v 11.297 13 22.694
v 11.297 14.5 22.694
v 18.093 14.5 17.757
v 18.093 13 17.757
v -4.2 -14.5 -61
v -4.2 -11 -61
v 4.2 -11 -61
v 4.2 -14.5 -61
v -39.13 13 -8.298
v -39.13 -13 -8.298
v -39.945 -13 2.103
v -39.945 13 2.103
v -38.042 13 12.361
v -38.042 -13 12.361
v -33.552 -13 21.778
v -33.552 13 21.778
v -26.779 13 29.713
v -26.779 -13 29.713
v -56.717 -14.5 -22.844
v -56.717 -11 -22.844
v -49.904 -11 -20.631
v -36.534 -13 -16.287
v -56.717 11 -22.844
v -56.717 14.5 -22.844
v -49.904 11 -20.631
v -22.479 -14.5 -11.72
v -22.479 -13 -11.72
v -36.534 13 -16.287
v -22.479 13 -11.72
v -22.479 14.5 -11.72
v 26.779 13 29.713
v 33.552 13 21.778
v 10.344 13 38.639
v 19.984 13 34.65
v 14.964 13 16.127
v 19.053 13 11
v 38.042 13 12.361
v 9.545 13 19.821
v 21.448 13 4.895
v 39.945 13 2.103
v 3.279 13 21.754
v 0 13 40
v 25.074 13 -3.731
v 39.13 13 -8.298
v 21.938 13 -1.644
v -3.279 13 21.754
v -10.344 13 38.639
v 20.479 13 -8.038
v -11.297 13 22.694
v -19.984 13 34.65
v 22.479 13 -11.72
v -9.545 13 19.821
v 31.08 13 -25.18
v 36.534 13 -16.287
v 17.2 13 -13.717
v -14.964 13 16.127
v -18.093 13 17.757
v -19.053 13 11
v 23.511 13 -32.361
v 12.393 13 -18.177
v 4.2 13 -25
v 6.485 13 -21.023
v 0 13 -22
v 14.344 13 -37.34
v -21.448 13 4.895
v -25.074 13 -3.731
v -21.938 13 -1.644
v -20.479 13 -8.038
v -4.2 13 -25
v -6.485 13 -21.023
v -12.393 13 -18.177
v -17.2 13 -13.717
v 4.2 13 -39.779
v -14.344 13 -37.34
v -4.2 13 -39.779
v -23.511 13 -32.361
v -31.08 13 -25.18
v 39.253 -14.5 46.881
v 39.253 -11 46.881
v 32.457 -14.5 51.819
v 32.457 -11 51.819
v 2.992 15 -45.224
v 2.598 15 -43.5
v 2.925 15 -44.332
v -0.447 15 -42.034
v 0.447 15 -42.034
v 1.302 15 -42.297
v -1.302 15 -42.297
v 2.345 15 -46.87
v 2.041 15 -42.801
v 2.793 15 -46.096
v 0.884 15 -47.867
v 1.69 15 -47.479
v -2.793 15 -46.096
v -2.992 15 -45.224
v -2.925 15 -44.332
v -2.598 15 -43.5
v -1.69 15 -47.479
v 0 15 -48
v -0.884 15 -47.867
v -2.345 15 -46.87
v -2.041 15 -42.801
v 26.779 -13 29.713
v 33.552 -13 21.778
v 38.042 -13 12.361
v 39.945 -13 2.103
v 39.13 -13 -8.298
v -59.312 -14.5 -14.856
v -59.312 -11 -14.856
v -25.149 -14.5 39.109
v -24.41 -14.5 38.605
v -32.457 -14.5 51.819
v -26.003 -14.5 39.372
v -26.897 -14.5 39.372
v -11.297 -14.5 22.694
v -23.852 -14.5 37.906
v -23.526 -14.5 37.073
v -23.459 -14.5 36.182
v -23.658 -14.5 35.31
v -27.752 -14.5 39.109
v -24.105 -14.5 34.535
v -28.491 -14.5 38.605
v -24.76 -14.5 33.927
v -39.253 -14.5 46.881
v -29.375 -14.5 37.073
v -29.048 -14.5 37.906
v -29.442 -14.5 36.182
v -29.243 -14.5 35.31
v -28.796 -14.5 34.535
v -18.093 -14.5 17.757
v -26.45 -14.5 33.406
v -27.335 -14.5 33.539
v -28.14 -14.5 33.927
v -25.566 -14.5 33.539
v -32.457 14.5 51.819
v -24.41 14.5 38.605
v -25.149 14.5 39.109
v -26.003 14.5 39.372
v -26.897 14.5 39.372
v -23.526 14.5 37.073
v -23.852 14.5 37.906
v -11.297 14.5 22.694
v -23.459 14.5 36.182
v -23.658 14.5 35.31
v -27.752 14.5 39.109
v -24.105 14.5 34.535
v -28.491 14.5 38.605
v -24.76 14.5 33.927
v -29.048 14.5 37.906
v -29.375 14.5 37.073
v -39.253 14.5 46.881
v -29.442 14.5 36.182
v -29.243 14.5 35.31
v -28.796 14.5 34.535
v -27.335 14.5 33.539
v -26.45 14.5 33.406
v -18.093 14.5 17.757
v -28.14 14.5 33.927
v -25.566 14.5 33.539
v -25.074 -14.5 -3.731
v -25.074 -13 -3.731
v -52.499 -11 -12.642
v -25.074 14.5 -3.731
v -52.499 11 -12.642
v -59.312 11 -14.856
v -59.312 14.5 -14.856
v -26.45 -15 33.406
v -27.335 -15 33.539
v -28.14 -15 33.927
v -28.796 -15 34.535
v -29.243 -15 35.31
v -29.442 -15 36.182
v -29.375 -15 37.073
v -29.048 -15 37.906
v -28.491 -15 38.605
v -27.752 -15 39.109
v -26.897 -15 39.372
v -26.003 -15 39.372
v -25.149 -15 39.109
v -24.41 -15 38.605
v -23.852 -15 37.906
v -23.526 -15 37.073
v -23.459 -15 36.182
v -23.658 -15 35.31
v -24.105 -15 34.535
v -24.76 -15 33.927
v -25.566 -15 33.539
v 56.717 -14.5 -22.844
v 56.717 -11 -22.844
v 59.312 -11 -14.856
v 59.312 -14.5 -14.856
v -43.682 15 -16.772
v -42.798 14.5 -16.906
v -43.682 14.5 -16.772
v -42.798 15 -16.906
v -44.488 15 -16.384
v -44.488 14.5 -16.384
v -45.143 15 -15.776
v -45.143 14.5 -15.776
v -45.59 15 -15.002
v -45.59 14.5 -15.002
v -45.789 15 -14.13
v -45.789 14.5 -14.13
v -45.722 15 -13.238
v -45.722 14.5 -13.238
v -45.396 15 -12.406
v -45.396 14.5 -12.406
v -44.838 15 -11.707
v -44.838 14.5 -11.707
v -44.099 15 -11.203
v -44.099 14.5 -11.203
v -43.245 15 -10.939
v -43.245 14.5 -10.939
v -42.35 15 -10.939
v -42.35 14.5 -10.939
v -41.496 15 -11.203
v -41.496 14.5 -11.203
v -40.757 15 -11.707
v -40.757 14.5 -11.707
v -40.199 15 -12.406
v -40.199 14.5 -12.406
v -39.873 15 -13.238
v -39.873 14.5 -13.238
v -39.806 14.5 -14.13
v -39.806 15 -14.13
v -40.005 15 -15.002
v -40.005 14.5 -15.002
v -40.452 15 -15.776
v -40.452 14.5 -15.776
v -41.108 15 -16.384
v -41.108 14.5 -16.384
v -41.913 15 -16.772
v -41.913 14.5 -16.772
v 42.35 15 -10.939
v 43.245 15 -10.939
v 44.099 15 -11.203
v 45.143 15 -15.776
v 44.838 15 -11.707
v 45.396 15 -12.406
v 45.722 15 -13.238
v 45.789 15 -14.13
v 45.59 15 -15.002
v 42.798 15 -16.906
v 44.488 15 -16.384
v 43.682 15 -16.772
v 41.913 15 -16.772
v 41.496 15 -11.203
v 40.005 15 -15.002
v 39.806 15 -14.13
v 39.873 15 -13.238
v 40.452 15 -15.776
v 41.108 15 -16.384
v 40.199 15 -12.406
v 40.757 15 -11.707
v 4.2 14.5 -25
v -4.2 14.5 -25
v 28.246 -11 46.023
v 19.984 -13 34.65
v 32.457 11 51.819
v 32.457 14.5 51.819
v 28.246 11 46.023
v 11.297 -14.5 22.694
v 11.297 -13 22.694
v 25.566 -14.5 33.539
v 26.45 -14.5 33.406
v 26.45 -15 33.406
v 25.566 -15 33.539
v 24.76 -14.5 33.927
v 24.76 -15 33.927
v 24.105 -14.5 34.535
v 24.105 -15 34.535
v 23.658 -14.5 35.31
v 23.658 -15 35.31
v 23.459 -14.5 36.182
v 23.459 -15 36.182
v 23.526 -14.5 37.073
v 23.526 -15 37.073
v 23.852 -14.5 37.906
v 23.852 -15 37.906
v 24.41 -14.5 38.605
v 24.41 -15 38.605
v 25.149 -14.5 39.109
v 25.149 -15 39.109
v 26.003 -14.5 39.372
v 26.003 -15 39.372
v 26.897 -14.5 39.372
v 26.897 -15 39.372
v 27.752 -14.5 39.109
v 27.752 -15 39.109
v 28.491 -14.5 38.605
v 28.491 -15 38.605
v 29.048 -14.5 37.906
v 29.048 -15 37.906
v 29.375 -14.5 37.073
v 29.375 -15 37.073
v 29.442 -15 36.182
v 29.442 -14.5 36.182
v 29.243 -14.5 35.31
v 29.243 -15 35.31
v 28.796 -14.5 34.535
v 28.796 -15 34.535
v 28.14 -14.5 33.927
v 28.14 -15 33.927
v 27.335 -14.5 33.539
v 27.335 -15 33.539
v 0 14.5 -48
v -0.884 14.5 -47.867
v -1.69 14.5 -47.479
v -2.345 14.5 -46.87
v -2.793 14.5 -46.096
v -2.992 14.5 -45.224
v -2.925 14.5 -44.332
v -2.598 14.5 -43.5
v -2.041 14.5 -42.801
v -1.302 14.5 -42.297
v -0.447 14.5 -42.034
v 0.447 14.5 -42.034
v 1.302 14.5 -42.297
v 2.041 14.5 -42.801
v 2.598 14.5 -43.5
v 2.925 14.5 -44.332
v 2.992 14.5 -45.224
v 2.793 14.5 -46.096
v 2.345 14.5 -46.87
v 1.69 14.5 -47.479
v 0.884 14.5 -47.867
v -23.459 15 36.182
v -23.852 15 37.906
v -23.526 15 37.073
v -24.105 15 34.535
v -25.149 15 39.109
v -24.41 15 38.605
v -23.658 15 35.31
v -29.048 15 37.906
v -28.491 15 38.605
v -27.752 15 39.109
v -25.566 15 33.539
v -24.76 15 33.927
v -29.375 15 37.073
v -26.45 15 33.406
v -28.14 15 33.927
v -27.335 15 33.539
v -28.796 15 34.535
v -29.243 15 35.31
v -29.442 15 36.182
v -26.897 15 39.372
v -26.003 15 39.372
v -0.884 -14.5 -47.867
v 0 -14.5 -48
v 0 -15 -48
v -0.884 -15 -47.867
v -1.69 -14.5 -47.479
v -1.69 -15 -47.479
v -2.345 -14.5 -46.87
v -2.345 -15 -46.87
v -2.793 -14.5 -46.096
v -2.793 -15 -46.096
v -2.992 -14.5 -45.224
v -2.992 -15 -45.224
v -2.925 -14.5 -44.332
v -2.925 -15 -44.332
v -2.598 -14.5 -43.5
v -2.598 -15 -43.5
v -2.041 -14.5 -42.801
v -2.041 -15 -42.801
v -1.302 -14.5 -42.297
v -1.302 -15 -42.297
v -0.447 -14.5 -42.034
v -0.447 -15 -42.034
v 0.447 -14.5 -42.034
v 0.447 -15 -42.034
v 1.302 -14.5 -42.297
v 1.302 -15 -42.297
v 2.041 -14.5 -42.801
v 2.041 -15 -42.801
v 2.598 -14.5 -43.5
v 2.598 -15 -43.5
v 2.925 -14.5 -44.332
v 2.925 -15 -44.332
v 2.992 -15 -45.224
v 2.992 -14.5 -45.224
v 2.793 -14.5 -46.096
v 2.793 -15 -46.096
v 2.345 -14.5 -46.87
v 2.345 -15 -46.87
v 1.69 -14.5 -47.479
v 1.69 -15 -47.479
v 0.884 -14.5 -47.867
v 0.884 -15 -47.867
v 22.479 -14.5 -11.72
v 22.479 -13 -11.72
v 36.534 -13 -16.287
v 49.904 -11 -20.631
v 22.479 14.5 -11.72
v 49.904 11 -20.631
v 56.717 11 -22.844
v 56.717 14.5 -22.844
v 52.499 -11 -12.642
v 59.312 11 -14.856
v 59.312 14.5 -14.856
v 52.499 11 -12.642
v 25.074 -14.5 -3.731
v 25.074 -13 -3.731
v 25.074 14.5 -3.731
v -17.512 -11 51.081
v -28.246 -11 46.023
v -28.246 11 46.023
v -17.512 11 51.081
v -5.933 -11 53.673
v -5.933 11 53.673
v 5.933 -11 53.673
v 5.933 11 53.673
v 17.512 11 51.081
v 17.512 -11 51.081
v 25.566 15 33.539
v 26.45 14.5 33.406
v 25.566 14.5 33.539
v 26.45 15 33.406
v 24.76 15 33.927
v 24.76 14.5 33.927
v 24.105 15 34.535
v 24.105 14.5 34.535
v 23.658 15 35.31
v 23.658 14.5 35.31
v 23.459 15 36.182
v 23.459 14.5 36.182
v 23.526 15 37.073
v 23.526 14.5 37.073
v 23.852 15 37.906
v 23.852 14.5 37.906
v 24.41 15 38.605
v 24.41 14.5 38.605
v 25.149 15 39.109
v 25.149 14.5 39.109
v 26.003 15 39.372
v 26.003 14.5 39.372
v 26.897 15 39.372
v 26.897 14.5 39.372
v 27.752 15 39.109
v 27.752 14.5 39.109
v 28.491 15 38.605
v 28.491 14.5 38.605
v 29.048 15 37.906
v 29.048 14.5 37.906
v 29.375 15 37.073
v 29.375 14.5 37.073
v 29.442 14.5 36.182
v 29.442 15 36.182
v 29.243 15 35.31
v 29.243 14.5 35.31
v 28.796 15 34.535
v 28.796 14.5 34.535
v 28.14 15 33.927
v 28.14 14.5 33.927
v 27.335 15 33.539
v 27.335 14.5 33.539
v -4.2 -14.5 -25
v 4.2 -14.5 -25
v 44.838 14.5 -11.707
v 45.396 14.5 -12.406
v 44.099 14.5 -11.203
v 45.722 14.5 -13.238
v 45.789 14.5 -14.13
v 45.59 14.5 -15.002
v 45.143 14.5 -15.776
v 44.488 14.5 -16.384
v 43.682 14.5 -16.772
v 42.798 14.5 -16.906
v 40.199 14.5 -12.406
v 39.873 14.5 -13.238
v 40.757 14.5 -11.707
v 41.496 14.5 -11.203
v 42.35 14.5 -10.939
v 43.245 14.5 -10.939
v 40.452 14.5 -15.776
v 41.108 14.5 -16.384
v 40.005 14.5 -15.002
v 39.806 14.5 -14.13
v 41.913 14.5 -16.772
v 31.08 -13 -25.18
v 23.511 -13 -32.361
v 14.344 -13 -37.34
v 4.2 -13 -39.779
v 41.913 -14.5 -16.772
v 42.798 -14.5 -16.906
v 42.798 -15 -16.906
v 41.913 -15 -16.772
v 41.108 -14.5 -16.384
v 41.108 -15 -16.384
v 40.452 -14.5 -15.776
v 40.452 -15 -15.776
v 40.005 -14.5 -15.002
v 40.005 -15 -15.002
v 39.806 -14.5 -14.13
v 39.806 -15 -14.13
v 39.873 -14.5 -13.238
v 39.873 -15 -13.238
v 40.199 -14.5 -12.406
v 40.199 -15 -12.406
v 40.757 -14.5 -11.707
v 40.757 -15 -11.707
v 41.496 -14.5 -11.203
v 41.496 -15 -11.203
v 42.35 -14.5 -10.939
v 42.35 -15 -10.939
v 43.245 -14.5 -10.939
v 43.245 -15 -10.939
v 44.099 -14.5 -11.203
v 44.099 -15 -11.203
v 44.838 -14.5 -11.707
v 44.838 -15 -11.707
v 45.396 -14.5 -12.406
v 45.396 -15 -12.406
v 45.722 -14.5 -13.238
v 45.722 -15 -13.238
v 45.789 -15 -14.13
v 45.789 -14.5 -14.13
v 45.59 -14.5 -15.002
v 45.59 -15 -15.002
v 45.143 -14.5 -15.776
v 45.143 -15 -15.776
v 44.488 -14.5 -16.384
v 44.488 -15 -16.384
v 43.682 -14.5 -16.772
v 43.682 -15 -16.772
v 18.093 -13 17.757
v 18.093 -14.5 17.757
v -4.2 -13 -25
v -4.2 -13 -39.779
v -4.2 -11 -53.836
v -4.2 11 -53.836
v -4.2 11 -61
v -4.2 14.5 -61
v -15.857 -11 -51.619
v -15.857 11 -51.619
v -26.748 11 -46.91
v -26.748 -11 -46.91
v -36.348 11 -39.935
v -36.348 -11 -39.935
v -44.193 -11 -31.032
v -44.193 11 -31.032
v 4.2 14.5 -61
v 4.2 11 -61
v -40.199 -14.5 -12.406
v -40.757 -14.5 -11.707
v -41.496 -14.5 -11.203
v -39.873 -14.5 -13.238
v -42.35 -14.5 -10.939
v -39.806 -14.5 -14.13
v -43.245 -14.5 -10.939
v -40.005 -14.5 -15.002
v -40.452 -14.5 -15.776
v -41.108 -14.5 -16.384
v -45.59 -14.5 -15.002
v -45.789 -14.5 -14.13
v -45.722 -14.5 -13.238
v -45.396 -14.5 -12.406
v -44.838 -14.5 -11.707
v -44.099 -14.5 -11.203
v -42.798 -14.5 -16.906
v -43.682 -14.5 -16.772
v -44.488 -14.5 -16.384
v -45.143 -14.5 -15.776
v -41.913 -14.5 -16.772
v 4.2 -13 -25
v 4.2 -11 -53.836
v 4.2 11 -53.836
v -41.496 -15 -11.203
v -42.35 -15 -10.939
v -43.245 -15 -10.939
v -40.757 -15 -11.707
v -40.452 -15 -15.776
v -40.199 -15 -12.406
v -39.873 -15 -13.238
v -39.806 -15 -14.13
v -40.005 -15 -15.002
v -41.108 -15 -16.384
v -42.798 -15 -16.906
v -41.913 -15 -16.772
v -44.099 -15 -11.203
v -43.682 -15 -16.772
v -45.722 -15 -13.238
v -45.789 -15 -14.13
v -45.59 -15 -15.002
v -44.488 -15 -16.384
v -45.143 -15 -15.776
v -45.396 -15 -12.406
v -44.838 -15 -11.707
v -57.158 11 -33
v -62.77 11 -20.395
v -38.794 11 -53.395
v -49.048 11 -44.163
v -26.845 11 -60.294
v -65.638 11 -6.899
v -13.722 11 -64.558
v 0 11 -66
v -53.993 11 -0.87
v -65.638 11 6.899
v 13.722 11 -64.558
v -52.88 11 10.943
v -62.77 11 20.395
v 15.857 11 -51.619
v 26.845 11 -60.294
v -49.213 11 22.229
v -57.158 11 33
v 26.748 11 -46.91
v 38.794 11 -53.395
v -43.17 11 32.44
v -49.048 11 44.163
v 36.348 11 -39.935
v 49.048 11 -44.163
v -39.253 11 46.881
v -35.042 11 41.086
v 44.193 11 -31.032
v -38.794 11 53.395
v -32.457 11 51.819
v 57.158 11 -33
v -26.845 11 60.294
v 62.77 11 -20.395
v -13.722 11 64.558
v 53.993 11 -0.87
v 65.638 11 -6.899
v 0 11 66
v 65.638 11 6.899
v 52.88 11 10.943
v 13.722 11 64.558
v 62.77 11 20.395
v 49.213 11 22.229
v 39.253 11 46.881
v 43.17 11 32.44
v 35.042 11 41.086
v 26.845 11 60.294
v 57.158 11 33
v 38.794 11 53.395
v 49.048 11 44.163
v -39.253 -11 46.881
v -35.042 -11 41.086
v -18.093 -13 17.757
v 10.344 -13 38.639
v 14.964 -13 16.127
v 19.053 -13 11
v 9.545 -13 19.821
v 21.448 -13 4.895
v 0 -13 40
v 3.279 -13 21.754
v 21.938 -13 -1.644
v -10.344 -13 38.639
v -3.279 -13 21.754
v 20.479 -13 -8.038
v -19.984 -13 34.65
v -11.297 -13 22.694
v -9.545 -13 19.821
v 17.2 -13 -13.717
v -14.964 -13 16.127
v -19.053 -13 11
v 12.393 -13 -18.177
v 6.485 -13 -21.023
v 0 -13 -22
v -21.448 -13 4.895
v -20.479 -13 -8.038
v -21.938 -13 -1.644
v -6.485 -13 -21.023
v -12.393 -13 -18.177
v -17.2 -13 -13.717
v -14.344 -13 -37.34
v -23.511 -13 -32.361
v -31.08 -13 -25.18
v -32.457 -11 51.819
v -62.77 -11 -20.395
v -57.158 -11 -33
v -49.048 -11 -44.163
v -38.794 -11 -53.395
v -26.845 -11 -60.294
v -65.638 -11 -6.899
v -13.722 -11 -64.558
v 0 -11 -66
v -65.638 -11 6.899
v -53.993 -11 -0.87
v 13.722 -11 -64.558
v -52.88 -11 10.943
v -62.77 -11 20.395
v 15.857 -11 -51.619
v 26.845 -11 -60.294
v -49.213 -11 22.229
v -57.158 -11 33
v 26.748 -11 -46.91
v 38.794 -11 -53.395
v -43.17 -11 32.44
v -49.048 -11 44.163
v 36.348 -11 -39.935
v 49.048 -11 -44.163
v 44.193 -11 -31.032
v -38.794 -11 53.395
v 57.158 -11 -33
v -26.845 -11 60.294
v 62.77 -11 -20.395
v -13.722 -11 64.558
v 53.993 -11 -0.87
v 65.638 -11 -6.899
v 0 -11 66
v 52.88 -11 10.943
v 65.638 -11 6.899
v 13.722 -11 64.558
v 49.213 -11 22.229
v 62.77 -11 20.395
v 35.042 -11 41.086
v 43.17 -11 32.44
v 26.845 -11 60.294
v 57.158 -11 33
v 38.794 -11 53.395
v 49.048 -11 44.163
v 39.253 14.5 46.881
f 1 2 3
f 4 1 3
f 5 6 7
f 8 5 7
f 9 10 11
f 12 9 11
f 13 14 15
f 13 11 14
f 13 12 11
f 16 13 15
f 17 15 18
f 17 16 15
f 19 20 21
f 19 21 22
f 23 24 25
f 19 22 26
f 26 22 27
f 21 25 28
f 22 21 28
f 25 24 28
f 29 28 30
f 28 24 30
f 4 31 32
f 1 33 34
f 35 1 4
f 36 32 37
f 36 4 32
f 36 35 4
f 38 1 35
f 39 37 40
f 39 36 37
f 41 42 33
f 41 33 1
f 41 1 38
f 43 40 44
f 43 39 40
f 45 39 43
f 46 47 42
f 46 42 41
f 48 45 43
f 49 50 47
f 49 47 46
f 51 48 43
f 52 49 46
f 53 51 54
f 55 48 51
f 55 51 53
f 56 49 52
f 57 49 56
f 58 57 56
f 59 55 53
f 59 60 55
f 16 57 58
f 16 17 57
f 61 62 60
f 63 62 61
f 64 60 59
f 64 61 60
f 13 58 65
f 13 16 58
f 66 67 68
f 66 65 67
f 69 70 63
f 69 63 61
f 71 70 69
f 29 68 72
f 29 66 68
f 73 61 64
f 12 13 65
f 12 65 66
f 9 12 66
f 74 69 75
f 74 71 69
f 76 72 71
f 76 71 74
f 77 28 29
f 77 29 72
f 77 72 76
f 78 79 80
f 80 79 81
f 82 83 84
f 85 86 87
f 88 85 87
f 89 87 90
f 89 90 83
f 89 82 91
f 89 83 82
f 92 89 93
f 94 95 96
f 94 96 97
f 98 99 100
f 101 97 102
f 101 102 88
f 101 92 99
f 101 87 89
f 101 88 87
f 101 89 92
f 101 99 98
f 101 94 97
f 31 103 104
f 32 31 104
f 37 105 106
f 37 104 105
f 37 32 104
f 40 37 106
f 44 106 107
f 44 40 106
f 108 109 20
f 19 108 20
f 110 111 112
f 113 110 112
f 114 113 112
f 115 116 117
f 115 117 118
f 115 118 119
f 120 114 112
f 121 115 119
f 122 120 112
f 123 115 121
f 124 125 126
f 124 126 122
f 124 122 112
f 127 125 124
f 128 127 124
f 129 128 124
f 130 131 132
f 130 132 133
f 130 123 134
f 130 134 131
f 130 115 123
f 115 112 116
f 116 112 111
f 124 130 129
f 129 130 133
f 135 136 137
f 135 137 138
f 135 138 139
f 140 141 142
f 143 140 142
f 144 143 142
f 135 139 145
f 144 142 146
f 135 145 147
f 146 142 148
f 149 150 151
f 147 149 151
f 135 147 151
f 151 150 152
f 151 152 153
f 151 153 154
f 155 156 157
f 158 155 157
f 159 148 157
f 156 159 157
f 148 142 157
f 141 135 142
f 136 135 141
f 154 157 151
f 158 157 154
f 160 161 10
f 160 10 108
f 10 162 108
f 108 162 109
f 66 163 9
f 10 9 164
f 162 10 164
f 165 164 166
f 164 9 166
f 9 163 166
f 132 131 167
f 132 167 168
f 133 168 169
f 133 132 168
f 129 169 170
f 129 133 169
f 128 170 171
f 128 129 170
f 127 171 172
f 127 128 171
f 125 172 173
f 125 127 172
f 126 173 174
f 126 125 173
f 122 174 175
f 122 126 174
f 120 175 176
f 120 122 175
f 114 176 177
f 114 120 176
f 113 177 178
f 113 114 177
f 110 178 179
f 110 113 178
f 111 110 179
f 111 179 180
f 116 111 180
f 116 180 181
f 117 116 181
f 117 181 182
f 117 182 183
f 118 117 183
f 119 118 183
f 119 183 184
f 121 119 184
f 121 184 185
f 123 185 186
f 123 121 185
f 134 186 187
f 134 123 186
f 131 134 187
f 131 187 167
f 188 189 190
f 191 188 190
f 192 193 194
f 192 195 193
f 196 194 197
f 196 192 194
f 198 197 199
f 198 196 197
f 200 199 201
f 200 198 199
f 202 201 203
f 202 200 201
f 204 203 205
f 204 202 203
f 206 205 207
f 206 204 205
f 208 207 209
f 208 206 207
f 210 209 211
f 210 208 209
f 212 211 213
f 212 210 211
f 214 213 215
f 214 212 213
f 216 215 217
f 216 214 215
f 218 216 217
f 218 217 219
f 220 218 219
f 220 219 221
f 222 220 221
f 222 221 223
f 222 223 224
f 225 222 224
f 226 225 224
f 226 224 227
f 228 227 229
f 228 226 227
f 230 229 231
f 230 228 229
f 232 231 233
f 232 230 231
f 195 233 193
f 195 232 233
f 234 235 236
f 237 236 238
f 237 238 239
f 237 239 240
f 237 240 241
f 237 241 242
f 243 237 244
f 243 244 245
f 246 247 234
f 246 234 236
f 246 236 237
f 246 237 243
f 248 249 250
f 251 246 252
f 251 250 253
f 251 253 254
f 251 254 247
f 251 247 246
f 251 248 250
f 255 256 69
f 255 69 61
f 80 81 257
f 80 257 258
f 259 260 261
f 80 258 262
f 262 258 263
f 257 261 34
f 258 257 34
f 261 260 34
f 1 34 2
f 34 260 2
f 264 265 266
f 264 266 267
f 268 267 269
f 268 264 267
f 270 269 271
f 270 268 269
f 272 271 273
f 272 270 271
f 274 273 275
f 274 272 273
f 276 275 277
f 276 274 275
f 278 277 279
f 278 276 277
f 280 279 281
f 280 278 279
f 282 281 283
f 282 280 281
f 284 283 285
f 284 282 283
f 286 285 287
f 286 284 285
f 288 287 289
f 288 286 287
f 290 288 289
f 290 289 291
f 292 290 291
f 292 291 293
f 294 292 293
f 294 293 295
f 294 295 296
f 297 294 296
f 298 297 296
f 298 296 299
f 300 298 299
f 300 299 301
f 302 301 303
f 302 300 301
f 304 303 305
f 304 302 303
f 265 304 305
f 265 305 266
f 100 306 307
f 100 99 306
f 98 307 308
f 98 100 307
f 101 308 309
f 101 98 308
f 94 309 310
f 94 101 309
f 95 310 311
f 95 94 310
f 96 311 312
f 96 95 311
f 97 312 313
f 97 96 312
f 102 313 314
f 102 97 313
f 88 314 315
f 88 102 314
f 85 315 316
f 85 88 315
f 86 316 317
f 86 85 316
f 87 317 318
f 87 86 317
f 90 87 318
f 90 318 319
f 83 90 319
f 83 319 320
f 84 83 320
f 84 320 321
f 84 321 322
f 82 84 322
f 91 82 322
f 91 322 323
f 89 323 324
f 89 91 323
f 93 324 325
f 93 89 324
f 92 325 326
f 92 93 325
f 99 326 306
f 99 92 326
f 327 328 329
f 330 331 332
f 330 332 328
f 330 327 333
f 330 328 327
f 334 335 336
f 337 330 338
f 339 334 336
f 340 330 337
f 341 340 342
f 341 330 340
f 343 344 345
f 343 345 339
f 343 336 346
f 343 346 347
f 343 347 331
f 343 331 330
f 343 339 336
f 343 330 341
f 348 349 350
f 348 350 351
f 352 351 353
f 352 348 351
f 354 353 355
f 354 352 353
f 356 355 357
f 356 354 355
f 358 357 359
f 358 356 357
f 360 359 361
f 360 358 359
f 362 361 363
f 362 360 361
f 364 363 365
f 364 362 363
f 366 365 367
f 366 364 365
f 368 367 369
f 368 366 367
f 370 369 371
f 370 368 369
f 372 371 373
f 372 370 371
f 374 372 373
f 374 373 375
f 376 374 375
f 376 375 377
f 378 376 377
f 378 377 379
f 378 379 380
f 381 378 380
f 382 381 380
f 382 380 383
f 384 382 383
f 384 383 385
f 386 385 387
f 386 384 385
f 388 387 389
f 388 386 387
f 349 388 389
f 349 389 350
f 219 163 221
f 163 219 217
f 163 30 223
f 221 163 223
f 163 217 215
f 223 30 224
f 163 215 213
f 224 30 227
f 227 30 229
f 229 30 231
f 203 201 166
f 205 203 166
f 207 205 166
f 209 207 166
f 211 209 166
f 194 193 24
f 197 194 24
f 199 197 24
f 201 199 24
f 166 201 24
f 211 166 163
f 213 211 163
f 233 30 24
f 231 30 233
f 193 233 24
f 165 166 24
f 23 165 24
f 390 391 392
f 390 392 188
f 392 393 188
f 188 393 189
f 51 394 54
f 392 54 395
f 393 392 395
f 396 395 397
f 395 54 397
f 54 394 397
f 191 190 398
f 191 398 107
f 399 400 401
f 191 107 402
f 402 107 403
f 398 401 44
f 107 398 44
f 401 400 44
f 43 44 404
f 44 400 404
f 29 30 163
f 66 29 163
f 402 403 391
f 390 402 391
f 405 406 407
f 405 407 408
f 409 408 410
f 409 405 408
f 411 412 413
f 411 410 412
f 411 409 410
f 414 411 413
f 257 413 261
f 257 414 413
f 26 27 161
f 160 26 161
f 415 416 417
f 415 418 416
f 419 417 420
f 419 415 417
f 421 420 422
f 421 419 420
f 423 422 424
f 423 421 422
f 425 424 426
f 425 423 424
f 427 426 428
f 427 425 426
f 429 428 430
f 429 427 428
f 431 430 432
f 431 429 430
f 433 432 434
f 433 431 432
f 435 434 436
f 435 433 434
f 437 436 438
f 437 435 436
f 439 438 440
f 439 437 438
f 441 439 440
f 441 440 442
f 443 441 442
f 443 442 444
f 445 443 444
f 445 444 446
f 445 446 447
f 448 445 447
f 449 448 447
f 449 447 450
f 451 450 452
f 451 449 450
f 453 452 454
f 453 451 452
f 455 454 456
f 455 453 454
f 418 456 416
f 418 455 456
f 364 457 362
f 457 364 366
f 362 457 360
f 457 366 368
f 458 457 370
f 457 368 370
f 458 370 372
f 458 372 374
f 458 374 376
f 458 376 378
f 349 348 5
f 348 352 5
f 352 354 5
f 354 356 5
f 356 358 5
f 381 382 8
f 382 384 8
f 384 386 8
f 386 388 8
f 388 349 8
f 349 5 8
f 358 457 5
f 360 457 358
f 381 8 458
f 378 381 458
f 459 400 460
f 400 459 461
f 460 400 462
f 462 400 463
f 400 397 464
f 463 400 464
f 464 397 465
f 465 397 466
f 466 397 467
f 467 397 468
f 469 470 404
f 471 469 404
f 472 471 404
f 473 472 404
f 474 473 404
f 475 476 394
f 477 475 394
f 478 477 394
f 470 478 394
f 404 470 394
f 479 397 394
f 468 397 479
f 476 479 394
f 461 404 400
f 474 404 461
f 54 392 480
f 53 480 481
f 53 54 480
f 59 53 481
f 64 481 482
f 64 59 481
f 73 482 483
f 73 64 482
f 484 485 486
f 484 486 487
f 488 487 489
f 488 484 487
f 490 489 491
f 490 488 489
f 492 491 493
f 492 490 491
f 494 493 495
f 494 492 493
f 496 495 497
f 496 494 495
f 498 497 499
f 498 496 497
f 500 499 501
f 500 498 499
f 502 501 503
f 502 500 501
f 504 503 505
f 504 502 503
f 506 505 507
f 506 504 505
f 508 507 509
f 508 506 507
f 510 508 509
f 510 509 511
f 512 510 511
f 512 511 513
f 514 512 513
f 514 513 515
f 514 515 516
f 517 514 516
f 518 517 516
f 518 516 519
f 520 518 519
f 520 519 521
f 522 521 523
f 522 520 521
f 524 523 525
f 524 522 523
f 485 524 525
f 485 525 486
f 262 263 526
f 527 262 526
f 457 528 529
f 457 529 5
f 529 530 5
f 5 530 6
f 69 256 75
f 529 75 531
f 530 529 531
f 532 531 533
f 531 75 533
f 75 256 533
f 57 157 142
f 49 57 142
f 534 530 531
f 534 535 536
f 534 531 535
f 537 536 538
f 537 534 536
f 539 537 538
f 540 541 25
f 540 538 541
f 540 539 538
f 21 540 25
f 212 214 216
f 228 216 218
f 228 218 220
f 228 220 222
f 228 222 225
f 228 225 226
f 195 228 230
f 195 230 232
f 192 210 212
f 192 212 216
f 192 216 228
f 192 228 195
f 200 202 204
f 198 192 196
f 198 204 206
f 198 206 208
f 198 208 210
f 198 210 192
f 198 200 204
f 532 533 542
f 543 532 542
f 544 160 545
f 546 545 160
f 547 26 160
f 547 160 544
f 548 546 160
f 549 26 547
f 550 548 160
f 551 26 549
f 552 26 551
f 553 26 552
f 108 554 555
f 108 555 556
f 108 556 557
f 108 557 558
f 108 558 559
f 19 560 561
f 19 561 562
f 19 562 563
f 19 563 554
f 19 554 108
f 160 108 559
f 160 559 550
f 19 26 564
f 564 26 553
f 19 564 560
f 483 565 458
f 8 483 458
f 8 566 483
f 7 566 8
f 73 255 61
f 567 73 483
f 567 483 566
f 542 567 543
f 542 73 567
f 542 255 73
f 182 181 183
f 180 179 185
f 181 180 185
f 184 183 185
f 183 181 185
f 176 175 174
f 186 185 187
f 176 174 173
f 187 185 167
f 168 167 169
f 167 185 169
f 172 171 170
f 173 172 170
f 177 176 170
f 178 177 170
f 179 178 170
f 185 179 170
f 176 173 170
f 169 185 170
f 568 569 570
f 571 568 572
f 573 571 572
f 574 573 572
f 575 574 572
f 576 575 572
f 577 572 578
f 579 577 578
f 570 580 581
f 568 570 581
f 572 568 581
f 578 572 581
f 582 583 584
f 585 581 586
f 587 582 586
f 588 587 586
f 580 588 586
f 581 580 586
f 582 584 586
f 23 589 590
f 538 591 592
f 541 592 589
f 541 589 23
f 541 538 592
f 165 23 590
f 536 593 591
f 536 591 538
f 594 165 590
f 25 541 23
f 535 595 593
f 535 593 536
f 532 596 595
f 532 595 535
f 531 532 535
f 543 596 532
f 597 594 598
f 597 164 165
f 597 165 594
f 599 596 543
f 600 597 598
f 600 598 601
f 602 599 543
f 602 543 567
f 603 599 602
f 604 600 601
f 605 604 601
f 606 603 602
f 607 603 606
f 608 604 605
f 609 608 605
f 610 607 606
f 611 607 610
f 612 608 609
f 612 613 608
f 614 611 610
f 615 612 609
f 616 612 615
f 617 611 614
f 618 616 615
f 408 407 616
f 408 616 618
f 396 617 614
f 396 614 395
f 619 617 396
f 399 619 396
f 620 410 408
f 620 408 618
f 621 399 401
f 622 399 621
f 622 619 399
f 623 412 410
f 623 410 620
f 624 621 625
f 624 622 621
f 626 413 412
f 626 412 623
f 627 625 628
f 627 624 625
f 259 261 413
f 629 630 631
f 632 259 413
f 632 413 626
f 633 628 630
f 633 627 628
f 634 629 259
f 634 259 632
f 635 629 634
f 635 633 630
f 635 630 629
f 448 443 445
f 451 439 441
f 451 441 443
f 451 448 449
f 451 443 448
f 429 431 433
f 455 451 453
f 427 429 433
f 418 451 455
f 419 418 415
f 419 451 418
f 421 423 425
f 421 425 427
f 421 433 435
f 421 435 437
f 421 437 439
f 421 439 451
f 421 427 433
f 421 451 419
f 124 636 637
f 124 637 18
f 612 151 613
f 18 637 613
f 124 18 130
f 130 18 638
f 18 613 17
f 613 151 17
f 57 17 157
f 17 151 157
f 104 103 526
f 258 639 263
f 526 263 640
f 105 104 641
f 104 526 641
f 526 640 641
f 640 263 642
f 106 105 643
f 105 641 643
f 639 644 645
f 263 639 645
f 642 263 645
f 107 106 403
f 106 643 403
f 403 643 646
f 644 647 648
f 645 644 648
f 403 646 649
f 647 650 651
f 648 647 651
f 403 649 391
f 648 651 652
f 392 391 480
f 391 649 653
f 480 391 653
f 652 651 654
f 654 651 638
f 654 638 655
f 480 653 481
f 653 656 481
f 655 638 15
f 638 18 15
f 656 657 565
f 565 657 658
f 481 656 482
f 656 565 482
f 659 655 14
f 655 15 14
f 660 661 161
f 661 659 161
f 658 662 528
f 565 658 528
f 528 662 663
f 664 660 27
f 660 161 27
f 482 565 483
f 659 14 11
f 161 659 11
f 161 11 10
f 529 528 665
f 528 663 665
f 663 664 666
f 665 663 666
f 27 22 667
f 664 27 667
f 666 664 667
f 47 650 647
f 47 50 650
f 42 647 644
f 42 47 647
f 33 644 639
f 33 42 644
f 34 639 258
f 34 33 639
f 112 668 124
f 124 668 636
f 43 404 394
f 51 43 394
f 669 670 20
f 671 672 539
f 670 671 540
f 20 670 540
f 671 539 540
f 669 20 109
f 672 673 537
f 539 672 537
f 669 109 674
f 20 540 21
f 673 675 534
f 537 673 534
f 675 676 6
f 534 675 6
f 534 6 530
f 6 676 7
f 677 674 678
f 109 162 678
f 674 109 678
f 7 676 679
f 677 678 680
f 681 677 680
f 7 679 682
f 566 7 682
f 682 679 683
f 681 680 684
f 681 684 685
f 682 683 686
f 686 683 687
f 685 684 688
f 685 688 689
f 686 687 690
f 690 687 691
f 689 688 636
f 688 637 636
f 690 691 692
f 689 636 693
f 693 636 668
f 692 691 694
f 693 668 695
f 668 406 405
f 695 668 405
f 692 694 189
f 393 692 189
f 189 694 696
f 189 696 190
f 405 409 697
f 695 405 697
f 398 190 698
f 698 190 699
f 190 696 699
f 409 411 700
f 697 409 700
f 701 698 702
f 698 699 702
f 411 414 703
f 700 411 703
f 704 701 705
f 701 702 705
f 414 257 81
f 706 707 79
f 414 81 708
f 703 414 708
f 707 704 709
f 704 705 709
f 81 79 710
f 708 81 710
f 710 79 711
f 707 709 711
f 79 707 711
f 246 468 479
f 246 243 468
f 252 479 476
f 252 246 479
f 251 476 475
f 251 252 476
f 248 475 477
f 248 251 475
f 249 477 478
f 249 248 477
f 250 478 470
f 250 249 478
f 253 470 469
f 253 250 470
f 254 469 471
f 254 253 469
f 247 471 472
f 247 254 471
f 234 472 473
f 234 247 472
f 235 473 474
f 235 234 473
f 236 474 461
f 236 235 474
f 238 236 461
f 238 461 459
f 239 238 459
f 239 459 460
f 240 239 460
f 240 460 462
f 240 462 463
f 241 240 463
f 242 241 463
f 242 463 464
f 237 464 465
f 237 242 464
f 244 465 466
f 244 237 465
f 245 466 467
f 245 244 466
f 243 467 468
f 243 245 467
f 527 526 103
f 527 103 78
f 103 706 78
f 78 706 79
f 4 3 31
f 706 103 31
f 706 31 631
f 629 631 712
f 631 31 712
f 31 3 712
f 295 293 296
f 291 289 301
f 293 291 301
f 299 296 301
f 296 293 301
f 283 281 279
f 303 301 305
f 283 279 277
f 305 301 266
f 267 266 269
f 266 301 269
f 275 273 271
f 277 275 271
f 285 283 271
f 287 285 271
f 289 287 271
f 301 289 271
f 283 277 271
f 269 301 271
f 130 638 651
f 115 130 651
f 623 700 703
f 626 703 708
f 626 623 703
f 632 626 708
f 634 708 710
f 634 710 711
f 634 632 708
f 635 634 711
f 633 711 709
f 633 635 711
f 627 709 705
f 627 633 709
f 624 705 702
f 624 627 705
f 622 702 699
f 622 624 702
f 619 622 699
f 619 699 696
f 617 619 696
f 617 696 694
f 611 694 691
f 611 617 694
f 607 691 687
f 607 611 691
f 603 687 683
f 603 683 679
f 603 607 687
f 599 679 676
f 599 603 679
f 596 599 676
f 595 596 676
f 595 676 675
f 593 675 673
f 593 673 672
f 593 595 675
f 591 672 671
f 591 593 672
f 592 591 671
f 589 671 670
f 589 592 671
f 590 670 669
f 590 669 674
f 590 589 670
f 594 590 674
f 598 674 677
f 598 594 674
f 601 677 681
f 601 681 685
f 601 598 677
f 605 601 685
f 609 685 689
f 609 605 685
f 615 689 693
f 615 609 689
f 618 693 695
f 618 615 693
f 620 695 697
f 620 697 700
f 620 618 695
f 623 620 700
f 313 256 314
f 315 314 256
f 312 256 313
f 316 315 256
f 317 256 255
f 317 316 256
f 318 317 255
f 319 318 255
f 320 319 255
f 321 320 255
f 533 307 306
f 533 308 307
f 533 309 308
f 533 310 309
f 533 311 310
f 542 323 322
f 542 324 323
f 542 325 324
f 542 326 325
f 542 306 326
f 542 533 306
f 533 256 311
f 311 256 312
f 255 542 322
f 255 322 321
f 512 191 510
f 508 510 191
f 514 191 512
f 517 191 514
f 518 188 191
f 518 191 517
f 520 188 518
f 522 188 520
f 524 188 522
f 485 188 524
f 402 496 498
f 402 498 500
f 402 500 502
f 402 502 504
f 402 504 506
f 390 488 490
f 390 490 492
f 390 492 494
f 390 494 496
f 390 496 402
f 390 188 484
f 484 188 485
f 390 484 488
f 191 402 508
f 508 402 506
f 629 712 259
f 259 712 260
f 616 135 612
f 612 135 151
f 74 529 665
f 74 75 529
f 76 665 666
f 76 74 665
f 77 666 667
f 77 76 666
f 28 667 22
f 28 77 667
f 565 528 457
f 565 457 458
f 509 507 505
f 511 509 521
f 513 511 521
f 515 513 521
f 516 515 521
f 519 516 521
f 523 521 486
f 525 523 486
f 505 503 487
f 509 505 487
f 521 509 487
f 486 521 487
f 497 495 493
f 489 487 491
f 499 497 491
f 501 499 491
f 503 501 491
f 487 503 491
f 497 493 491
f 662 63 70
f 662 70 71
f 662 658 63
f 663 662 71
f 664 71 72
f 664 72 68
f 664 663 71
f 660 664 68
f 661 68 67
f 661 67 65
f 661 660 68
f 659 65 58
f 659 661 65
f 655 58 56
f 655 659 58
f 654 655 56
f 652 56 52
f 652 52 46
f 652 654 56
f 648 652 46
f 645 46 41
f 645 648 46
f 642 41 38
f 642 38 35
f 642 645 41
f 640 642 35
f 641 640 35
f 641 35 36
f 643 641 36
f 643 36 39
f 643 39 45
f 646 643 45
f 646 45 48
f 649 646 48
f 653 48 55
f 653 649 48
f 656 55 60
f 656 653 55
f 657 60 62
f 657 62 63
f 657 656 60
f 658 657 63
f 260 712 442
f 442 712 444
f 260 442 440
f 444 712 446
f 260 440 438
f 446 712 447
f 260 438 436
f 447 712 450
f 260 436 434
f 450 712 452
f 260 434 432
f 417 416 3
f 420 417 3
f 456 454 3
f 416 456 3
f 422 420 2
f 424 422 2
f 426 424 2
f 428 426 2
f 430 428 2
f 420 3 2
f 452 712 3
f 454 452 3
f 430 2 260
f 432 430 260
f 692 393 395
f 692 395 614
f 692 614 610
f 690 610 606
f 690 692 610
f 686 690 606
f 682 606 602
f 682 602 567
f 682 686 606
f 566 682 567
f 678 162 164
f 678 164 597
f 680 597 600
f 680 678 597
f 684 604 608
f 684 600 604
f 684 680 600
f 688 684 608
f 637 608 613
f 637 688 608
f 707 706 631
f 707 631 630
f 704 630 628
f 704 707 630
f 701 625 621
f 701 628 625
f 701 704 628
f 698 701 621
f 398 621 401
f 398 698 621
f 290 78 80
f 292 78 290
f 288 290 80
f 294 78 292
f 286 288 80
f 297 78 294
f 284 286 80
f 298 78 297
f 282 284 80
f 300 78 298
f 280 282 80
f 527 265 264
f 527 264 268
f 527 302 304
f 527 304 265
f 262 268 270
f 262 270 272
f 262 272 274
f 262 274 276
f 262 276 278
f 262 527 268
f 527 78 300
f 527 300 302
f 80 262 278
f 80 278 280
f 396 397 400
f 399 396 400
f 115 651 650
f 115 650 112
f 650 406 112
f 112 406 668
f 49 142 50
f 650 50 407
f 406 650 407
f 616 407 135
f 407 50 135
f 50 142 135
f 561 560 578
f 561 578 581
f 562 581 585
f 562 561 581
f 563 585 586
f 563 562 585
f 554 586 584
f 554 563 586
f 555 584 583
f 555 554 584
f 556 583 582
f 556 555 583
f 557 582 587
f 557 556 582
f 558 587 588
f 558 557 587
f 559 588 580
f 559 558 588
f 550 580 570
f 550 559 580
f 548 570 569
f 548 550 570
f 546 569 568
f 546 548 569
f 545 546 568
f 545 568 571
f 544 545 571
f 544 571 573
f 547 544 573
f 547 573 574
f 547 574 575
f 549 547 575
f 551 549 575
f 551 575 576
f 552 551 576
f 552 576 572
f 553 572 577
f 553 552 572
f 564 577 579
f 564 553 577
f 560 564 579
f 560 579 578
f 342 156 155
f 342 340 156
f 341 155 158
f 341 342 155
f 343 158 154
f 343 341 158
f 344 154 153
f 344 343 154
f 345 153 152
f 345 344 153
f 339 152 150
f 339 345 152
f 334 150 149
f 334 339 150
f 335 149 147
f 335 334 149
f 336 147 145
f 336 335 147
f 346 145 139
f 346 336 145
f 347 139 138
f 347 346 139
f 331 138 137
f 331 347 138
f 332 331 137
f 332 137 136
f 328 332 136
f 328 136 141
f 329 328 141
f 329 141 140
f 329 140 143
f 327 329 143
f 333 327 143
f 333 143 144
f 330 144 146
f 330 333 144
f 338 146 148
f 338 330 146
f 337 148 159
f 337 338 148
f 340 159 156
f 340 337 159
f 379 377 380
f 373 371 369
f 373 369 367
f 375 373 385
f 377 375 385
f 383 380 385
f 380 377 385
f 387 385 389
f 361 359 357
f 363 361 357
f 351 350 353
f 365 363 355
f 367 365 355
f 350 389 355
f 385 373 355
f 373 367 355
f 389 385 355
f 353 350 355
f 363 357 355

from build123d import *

# Parameters (mm, degrees)
SKETCH1_R            = 66
SKETCH1_R_2          = 54
RIM_OUTER_RING_DEPTH = 11
SKETCH2_R            = 40
SKETCH2_R_2          = 22
RIM_HUB_RING_DEPTH   = 13
RIM_SPOKE_1_DEPTH    = 14.5
SKETCH4_R            = 3
RIM_BOLT_PAD_1_DEPTH = 15
SKETCH5_W            = 8.4
SKETCH5_H            = 36
RIM_SPOKE_2_DEPTH    = 14.5
SKETCH6_R            = 3
RIM_BOLT_PAD_2_DEPTH = 15
RIM_SPOKE_3_DEPTH    = 14.5
SKETCH8_R            = 3
RIM_BOLT_PAD_3_DEPTH = 15
RIM_SPOKE_4_DEPTH    = 14.5
SKETCH10_R           = 3
RIM_BOLT_PAD_4_DEPTH = 15
RIM_SPOKE_5_DEPTH    = 14.5
SKETCH12_R           = 3
RIM_BOLT_PAD_5_DEPTH = 15


with BuildPart() as part:
    # Sketch1 → rim outer ring (new, symmetric)
    with BuildSketch(Plane(origin=(0, 0, 0), x_dir=(1, 0, 0), z_dir=(0, 1, 0))):
        with Locations(Location((0, 0, 0), (0, 0, 270))):
            Circle(SKETCH1_R)
        with Locations(Location((0, 0, 0), (0, 0, 270))):
            Circle(SKETCH1_R_2, mode=Mode.SUBTRACT)
    extrude(amount=RIM_OUTER_RING_DEPTH, both=True)



with BuildPart() as body_2:
    # Sketch2 → rim hub ring (new, symmetric)
    with BuildSketch(Plane(origin=(0, 0, 0), x_dir=(1, 0, 0), z_dir=(0, 1, 0))):
        with Locations(Location((0, 0, 0), (0, 0, 90))):
            Circle(SKETCH2_R)
        with Locations(Location((0, 0, 0), (0, 0, 90))):
            Circle(SKETCH2_R_2, mode=Mode.SUBTRACT)
    extrude(amount=RIM_HUB_RING_DEPTH, both=True)


with BuildPart() as part_1:
    add(part.part)

    add(body_2.part)  # rim spoke 1 merges body 2
    # Sketch3 → rim spoke 1 (add, symmetric)
    with BuildSketch(Plane(origin=(0, 0, 0), x_dir=(1, 0, 0), z_dir=(0, 1, 0))):
        Polygon((22.478541531, 11.719862228), (56.716576118, 22.844474025), (59.31231887, 14.855599288), (25.074284284, 3.730987491), align=None)
    extrude(amount=RIM_SPOKE_1_DEPTH, both=True)

    # Sketch4 → rim bolt pad 1 (add, symmetric)
    with BuildSketch(Plane(origin=(0, 0, 0), x_dir=(1, 0, 0), z_dir=(0, 1, 0))):
        with Locations(Location((42.797543233, 13.905764747, 0), (0, 0, 90))):
            Circle(SKETCH4_R)
    extrude(amount=RIM_BOLT_PAD_1_DEPTH, both=True)

    # Sketch5 → rim spoke 2 (add, symmetric)
    with BuildSketch(Plane(origin=(0, 0, 0), x_dir=(1, 0, 0), z_dir=(0, 1, 0))):
        with Locations((0, 43)):
            Rectangle(SKETCH5_W, SKETCH5_H)
    extrude(amount=RIM_SPOKE_2_DEPTH, both=True)

    # Sketch6 → rim bolt pad 2 (add, symmetric)
    with BuildSketch(Plane(origin=(0, 0, 0), x_dir=(1, 0, 0), z_dir=(0, 1, 0))):
        with Locations(Location((0, 45, 0), (0, 0, 90))):
            Circle(SKETCH6_R)
    extrude(amount=RIM_BOLT_PAD_2_DEPTH, both=True)

    # Sketch7 → rim spoke 3 (add, symmetric)
    with BuildSketch(Plane(origin=(0, 0, 0), x_dir=(1, 0, 0), z_dir=(0, 1, 0))):
        Polygon((-25.074284284, 3.730987491), (-59.31231887, 14.855599288), (-56.716576118, 22.844474025), (-22.478541531, 11.719862228), align=None)
    extrude(amount=RIM_SPOKE_3_DEPTH, both=True)

    # Sketch8 → rim bolt pad 3 (add, symmetric)
    with BuildSketch(Plane(origin=(0, 0, 0), x_dir=(1, 0, 0), z_dir=(0, 1, 0))):
        with Locations(Location((-42.797543233, 13.905764747, 0), (0, 0, 90))):
            Circle(SKETCH8_R)
    extrude(amount=RIM_BOLT_PAD_3_DEPTH, both=True)

    # Sketch9 → rim spoke 4 (add, symmetric)
    with BuildSketch(Plane(origin=(0, 0, 0), x_dir=(1, 0, 0), z_dir=(0, 1, 0))):
        Polygon((-11.296759931, -22.694122919), (-32.457029013, -51.818734717), (-39.252771766, -46.881338597), (-18.092502684, -17.7567268), align=None)
    extrude(amount=RIM_SPOKE_4_DEPTH, both=True)

    # Sketch10 → rim bolt pad 4 (add, symmetric)
    with BuildSketch(Plane(origin=(0, 0, 0), x_dir=(1, 0, 0), z_dir=(0, 1, 0))):
        with Locations(Location((-26.450336353, -36.405764747, 0), (0, 0, 90))):
            Circle(SKETCH10_R)
    extrude(amount=RIM_BOLT_PAD_4_DEPTH, both=True)

    # Sketch11 → rim spoke 5 (add, symmetric)
    with BuildSketch(Plane(origin=(0, 0, 0), x_dir=(1, 0, 0), z_dir=(0, 1, 0))):
        Polygon((18.092502684, -17.7567268), (39.252771766, -46.881338597), (32.457029013, -51.818734717), (11.296759931, -22.694122919), align=None)
    extrude(amount=RIM_SPOKE_5_DEPTH, both=True)

    # Sketch12 → rim bolt pad 5 (add, symmetric)
    with BuildSketch(Plane(origin=(0, 0, 0), x_dir=(1, 0, 0), z_dir=(0, 1, 0))):
        with Locations(Location((26.450336353, -36.405764747, 0), (0, 0, 90))):
            Circle(SKETCH12_R)
    extrude(amount=RIM_BOLT_PAD_5_DEPTH, both=True)


solid = part_1.part
